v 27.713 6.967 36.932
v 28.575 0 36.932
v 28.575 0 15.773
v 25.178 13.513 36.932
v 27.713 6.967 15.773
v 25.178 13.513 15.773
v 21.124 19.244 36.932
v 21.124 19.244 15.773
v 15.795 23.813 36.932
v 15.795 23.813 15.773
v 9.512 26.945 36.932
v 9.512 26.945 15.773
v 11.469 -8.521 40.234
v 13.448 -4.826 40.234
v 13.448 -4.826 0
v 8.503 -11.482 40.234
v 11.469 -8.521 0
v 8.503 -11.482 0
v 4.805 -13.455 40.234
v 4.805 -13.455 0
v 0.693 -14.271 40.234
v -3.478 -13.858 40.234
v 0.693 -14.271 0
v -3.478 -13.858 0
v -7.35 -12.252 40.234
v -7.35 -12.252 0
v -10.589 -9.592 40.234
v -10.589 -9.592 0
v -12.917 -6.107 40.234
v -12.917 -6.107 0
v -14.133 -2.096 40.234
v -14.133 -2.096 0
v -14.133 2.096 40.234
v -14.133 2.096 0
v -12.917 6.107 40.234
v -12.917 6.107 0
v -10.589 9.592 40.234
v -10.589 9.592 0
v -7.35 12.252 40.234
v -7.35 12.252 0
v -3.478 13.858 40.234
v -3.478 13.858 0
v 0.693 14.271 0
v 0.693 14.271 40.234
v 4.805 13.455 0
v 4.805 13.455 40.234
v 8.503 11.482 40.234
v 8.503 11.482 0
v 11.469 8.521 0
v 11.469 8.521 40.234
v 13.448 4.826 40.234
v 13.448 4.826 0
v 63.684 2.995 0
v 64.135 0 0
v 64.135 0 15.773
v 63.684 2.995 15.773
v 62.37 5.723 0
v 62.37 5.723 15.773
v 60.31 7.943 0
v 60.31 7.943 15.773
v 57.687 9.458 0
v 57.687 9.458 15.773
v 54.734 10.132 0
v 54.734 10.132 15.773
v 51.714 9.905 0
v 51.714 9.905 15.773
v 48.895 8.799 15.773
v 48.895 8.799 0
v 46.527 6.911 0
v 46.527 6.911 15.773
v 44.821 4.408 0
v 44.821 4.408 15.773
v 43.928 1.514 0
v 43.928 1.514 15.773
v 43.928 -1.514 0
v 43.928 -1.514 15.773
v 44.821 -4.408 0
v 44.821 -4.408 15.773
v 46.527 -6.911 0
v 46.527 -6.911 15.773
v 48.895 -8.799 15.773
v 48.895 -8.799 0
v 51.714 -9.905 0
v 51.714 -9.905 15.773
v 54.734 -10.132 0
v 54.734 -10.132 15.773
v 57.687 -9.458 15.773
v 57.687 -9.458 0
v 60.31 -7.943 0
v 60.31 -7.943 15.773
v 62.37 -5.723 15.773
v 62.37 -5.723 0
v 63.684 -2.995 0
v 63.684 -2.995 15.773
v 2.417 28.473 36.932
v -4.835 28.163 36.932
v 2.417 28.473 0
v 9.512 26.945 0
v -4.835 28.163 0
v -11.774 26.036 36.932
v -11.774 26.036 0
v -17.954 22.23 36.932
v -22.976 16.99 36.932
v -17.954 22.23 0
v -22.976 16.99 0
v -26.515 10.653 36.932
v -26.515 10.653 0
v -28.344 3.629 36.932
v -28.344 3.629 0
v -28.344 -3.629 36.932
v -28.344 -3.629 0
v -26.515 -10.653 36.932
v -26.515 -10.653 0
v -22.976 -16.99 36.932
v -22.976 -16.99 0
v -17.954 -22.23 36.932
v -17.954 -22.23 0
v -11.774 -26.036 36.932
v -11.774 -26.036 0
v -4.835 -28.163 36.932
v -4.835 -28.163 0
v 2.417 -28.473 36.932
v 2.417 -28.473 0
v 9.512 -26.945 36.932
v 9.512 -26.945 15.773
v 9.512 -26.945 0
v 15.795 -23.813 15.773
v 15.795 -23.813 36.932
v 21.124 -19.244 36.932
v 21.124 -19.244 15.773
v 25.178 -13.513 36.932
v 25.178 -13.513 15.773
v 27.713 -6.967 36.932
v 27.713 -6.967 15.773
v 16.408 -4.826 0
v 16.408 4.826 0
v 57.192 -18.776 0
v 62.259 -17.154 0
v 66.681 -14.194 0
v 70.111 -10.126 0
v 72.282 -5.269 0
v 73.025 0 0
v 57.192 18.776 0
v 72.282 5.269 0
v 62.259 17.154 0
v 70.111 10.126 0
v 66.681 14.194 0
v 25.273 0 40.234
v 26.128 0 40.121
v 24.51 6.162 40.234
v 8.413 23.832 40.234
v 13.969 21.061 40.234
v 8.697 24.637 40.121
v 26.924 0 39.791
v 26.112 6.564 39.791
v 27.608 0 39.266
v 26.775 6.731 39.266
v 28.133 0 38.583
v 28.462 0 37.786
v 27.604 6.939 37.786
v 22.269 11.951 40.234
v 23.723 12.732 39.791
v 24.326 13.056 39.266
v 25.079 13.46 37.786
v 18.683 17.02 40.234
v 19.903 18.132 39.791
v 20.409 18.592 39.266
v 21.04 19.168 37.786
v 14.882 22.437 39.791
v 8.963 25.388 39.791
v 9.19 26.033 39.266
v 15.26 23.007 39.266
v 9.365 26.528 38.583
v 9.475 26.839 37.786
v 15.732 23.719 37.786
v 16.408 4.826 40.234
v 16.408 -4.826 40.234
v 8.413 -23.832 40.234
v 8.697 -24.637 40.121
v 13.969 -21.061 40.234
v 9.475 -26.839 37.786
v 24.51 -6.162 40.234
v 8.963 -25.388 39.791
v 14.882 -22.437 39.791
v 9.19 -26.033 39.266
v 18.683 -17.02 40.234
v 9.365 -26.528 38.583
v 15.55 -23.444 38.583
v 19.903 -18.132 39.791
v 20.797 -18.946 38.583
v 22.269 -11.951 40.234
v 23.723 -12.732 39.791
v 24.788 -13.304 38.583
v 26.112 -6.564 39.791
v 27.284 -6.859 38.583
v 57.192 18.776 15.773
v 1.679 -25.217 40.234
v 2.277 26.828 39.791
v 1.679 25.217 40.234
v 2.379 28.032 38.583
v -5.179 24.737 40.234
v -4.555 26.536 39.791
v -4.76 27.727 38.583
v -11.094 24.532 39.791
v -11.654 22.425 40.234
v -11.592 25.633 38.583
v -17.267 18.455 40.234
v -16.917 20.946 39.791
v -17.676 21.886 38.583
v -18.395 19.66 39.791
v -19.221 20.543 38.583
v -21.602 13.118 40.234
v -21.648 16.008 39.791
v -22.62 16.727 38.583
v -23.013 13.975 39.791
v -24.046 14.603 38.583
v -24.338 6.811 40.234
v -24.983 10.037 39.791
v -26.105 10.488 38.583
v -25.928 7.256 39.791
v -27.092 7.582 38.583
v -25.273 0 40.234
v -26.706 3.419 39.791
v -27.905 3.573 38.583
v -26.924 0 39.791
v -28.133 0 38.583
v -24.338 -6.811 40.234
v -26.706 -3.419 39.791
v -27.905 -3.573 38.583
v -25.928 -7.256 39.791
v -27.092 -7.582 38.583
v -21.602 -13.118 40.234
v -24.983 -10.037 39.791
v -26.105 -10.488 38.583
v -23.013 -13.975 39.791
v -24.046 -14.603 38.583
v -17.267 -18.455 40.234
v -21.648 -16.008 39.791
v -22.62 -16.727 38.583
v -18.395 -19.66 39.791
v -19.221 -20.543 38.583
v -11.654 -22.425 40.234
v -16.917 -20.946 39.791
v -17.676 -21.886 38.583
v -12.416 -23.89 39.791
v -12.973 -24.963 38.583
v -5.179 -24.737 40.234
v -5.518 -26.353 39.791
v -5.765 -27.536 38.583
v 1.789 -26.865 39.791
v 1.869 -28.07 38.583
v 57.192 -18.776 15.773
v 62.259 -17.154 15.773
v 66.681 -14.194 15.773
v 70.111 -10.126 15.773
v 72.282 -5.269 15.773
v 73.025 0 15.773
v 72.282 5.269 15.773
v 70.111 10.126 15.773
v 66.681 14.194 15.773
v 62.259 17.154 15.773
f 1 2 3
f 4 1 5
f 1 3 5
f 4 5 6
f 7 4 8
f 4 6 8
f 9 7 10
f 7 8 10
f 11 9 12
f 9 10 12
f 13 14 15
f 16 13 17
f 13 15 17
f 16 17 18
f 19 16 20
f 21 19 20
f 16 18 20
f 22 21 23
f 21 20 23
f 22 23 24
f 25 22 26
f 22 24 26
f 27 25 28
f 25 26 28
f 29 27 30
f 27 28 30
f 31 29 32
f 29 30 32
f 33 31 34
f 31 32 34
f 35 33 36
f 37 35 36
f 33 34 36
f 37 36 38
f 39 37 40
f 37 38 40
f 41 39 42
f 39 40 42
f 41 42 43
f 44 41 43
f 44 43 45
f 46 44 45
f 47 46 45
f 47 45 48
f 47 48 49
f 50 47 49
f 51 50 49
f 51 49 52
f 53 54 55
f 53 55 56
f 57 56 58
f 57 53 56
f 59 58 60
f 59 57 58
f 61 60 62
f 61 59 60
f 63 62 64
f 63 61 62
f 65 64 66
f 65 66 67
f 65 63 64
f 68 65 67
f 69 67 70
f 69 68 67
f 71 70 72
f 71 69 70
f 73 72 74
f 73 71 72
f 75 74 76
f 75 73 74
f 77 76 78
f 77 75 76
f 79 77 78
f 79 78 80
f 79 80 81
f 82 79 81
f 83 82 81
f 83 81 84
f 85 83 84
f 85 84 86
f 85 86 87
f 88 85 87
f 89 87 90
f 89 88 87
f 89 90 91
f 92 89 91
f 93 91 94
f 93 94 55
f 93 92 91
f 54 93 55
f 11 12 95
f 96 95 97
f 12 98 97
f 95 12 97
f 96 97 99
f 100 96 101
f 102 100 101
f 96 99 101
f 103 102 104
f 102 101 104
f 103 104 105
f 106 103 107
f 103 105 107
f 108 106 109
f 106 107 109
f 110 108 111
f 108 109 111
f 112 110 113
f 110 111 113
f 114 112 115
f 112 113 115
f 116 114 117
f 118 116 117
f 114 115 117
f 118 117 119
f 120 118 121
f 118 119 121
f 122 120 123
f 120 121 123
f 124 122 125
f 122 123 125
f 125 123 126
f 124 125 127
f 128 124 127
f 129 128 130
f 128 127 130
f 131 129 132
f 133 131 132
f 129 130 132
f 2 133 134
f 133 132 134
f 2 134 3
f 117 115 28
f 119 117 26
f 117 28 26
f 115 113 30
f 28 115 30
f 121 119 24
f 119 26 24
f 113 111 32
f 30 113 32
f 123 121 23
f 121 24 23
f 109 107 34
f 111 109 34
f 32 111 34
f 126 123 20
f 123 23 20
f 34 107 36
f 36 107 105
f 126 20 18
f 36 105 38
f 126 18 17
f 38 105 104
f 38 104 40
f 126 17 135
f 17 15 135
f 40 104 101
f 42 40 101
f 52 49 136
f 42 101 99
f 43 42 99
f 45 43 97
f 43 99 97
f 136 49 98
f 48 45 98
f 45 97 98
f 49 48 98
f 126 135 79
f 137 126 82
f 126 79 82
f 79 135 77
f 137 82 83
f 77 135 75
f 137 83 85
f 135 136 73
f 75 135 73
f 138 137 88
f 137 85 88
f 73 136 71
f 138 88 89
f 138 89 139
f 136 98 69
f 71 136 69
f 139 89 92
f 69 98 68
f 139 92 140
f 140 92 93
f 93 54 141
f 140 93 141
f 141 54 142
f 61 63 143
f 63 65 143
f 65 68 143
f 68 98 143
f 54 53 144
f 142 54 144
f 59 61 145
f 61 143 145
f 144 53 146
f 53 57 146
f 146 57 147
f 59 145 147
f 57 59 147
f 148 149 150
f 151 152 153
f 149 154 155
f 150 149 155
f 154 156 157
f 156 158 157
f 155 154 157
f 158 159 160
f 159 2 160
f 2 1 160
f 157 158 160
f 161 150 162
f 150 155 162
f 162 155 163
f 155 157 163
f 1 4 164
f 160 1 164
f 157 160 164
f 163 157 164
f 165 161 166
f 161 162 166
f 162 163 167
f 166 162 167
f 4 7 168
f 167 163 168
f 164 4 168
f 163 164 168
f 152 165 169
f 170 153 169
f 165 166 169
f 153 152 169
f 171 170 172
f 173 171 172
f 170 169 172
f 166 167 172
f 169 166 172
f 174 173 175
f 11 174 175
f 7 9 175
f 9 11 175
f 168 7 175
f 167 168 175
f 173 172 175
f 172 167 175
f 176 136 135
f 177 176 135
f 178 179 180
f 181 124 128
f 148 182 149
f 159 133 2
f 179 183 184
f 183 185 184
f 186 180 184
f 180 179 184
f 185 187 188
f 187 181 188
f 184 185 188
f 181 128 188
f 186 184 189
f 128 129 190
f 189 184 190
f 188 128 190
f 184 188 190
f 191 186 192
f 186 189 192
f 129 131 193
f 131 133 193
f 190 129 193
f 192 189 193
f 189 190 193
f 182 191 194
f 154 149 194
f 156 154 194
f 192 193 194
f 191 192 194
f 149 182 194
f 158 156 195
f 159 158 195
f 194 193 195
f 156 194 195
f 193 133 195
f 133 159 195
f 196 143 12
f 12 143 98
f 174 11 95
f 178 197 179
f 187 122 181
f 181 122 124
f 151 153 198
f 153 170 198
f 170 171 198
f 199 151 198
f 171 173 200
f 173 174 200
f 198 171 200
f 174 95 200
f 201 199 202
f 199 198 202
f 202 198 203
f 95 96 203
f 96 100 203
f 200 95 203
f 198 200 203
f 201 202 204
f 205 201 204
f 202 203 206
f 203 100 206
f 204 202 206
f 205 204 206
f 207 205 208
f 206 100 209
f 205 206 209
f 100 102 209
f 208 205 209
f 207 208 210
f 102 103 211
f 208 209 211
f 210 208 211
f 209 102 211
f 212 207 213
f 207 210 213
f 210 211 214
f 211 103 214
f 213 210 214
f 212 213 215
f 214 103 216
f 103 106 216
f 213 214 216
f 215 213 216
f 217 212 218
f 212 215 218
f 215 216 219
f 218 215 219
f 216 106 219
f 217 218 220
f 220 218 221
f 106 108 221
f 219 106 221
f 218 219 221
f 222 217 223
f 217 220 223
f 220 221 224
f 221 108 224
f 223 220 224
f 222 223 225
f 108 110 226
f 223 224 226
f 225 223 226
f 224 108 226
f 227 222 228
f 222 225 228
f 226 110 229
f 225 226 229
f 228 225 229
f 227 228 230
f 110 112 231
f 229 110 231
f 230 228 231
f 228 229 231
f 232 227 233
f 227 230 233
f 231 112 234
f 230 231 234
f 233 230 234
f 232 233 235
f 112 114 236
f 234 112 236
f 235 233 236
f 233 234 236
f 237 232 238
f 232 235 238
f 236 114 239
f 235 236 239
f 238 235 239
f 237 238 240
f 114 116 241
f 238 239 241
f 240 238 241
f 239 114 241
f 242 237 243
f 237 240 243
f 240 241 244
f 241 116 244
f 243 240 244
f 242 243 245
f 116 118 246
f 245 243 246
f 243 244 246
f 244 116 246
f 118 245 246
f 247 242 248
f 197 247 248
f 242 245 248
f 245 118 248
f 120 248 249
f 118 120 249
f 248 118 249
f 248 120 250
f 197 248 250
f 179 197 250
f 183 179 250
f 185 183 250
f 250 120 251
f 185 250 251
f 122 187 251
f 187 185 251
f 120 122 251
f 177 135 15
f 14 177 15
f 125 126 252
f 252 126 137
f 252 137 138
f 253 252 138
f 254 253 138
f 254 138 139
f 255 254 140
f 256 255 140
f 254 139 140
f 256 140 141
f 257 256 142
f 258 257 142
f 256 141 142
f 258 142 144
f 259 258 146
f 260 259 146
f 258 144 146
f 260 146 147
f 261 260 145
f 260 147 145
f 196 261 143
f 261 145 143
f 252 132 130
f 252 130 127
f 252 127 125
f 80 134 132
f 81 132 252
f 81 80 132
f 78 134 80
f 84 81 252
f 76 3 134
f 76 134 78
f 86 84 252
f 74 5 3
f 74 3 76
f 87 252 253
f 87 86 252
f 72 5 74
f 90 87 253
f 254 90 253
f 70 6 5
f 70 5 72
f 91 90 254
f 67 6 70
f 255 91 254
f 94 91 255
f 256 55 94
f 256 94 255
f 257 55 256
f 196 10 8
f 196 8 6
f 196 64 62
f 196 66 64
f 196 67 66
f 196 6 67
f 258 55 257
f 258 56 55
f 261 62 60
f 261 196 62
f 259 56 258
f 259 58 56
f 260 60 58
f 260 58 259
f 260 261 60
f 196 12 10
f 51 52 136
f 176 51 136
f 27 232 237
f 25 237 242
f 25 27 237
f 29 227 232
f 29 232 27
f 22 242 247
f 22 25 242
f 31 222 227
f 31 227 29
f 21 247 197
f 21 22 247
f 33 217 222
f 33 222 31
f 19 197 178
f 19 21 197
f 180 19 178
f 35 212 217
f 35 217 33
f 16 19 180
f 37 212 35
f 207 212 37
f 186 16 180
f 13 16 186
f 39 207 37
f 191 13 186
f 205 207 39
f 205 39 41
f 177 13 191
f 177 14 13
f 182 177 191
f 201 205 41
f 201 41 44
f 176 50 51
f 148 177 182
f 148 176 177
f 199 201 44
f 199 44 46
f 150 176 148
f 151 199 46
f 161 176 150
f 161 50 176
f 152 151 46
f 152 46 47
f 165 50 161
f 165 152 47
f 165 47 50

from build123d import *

# Parameters (mm, degrees)
F0_R     = 10.16
F1_DEPTH = 15.7734
F2_DEPTH = 40.2336
F3_R     = 3.302


with BuildPart() as f1:
    # F0 (on Top) → F1 (new body)
    with BuildSketch(Plane.XY):
        with BuildLine():
            ThreePointArc((9.512184, 26.945296), (23.327466, 16.503332), (28.575, 0))
            ThreePointArc((28.575, 0), (23.327466, -16.503332), (9.512184, -26.945296))
            Line((9.512184, -26.945296), (57.191927, -18.776418))
            ThreePointArc((57.191927, -18.776418), (73.025, 0), (57.191927, 18.776418))
            Line((57.191927, 18.776418), (9.512184, 26.945296))
        make_face()
        with Locations((53.975, 0)):
            Circle(F0_R, mode=Mode.SUBTRACT)
    extrude(amount=F1_DEPTH)

    # F0 (on Top) → F2 (join)
    with BuildSketch(Plane.XY):
        with BuildLine():
            ThreePointArc((9.512184, -26.945296), (23.327466, -16.503332), (28.575, 0))
            ThreePointArc((28.575, 0), (23.327466, 16.503332), (9.512184, 26.945296))
            ThreePointArc((9.512184, 26.945296), (-28.575, 0), (9.512184, -26.945296))
        make_face()
        with BuildLine():
            ThreePointArc((13.447765, -4.826), (-14.2875, 0), (13.447765, 4.826))
            Line((13.447765, 4.826), (16.4084, 4.826))
            Line((16.4084, 4.826), (16.4084, -4.826))
            Line((16.4084, -4.826), (13.447765, -4.826))
        make_face(mode=Mode.SUBTRACT)
    extrude(amount=F2_DEPTH)

    # F3
    f3_edges = [f1.edges().sort_by_distance(p)[0] for p in [
        (-9.512184, 26.945296, 40.2336),
    ]]
    fillet(f3_edges, radius=F3_R)


solid = f1.part
